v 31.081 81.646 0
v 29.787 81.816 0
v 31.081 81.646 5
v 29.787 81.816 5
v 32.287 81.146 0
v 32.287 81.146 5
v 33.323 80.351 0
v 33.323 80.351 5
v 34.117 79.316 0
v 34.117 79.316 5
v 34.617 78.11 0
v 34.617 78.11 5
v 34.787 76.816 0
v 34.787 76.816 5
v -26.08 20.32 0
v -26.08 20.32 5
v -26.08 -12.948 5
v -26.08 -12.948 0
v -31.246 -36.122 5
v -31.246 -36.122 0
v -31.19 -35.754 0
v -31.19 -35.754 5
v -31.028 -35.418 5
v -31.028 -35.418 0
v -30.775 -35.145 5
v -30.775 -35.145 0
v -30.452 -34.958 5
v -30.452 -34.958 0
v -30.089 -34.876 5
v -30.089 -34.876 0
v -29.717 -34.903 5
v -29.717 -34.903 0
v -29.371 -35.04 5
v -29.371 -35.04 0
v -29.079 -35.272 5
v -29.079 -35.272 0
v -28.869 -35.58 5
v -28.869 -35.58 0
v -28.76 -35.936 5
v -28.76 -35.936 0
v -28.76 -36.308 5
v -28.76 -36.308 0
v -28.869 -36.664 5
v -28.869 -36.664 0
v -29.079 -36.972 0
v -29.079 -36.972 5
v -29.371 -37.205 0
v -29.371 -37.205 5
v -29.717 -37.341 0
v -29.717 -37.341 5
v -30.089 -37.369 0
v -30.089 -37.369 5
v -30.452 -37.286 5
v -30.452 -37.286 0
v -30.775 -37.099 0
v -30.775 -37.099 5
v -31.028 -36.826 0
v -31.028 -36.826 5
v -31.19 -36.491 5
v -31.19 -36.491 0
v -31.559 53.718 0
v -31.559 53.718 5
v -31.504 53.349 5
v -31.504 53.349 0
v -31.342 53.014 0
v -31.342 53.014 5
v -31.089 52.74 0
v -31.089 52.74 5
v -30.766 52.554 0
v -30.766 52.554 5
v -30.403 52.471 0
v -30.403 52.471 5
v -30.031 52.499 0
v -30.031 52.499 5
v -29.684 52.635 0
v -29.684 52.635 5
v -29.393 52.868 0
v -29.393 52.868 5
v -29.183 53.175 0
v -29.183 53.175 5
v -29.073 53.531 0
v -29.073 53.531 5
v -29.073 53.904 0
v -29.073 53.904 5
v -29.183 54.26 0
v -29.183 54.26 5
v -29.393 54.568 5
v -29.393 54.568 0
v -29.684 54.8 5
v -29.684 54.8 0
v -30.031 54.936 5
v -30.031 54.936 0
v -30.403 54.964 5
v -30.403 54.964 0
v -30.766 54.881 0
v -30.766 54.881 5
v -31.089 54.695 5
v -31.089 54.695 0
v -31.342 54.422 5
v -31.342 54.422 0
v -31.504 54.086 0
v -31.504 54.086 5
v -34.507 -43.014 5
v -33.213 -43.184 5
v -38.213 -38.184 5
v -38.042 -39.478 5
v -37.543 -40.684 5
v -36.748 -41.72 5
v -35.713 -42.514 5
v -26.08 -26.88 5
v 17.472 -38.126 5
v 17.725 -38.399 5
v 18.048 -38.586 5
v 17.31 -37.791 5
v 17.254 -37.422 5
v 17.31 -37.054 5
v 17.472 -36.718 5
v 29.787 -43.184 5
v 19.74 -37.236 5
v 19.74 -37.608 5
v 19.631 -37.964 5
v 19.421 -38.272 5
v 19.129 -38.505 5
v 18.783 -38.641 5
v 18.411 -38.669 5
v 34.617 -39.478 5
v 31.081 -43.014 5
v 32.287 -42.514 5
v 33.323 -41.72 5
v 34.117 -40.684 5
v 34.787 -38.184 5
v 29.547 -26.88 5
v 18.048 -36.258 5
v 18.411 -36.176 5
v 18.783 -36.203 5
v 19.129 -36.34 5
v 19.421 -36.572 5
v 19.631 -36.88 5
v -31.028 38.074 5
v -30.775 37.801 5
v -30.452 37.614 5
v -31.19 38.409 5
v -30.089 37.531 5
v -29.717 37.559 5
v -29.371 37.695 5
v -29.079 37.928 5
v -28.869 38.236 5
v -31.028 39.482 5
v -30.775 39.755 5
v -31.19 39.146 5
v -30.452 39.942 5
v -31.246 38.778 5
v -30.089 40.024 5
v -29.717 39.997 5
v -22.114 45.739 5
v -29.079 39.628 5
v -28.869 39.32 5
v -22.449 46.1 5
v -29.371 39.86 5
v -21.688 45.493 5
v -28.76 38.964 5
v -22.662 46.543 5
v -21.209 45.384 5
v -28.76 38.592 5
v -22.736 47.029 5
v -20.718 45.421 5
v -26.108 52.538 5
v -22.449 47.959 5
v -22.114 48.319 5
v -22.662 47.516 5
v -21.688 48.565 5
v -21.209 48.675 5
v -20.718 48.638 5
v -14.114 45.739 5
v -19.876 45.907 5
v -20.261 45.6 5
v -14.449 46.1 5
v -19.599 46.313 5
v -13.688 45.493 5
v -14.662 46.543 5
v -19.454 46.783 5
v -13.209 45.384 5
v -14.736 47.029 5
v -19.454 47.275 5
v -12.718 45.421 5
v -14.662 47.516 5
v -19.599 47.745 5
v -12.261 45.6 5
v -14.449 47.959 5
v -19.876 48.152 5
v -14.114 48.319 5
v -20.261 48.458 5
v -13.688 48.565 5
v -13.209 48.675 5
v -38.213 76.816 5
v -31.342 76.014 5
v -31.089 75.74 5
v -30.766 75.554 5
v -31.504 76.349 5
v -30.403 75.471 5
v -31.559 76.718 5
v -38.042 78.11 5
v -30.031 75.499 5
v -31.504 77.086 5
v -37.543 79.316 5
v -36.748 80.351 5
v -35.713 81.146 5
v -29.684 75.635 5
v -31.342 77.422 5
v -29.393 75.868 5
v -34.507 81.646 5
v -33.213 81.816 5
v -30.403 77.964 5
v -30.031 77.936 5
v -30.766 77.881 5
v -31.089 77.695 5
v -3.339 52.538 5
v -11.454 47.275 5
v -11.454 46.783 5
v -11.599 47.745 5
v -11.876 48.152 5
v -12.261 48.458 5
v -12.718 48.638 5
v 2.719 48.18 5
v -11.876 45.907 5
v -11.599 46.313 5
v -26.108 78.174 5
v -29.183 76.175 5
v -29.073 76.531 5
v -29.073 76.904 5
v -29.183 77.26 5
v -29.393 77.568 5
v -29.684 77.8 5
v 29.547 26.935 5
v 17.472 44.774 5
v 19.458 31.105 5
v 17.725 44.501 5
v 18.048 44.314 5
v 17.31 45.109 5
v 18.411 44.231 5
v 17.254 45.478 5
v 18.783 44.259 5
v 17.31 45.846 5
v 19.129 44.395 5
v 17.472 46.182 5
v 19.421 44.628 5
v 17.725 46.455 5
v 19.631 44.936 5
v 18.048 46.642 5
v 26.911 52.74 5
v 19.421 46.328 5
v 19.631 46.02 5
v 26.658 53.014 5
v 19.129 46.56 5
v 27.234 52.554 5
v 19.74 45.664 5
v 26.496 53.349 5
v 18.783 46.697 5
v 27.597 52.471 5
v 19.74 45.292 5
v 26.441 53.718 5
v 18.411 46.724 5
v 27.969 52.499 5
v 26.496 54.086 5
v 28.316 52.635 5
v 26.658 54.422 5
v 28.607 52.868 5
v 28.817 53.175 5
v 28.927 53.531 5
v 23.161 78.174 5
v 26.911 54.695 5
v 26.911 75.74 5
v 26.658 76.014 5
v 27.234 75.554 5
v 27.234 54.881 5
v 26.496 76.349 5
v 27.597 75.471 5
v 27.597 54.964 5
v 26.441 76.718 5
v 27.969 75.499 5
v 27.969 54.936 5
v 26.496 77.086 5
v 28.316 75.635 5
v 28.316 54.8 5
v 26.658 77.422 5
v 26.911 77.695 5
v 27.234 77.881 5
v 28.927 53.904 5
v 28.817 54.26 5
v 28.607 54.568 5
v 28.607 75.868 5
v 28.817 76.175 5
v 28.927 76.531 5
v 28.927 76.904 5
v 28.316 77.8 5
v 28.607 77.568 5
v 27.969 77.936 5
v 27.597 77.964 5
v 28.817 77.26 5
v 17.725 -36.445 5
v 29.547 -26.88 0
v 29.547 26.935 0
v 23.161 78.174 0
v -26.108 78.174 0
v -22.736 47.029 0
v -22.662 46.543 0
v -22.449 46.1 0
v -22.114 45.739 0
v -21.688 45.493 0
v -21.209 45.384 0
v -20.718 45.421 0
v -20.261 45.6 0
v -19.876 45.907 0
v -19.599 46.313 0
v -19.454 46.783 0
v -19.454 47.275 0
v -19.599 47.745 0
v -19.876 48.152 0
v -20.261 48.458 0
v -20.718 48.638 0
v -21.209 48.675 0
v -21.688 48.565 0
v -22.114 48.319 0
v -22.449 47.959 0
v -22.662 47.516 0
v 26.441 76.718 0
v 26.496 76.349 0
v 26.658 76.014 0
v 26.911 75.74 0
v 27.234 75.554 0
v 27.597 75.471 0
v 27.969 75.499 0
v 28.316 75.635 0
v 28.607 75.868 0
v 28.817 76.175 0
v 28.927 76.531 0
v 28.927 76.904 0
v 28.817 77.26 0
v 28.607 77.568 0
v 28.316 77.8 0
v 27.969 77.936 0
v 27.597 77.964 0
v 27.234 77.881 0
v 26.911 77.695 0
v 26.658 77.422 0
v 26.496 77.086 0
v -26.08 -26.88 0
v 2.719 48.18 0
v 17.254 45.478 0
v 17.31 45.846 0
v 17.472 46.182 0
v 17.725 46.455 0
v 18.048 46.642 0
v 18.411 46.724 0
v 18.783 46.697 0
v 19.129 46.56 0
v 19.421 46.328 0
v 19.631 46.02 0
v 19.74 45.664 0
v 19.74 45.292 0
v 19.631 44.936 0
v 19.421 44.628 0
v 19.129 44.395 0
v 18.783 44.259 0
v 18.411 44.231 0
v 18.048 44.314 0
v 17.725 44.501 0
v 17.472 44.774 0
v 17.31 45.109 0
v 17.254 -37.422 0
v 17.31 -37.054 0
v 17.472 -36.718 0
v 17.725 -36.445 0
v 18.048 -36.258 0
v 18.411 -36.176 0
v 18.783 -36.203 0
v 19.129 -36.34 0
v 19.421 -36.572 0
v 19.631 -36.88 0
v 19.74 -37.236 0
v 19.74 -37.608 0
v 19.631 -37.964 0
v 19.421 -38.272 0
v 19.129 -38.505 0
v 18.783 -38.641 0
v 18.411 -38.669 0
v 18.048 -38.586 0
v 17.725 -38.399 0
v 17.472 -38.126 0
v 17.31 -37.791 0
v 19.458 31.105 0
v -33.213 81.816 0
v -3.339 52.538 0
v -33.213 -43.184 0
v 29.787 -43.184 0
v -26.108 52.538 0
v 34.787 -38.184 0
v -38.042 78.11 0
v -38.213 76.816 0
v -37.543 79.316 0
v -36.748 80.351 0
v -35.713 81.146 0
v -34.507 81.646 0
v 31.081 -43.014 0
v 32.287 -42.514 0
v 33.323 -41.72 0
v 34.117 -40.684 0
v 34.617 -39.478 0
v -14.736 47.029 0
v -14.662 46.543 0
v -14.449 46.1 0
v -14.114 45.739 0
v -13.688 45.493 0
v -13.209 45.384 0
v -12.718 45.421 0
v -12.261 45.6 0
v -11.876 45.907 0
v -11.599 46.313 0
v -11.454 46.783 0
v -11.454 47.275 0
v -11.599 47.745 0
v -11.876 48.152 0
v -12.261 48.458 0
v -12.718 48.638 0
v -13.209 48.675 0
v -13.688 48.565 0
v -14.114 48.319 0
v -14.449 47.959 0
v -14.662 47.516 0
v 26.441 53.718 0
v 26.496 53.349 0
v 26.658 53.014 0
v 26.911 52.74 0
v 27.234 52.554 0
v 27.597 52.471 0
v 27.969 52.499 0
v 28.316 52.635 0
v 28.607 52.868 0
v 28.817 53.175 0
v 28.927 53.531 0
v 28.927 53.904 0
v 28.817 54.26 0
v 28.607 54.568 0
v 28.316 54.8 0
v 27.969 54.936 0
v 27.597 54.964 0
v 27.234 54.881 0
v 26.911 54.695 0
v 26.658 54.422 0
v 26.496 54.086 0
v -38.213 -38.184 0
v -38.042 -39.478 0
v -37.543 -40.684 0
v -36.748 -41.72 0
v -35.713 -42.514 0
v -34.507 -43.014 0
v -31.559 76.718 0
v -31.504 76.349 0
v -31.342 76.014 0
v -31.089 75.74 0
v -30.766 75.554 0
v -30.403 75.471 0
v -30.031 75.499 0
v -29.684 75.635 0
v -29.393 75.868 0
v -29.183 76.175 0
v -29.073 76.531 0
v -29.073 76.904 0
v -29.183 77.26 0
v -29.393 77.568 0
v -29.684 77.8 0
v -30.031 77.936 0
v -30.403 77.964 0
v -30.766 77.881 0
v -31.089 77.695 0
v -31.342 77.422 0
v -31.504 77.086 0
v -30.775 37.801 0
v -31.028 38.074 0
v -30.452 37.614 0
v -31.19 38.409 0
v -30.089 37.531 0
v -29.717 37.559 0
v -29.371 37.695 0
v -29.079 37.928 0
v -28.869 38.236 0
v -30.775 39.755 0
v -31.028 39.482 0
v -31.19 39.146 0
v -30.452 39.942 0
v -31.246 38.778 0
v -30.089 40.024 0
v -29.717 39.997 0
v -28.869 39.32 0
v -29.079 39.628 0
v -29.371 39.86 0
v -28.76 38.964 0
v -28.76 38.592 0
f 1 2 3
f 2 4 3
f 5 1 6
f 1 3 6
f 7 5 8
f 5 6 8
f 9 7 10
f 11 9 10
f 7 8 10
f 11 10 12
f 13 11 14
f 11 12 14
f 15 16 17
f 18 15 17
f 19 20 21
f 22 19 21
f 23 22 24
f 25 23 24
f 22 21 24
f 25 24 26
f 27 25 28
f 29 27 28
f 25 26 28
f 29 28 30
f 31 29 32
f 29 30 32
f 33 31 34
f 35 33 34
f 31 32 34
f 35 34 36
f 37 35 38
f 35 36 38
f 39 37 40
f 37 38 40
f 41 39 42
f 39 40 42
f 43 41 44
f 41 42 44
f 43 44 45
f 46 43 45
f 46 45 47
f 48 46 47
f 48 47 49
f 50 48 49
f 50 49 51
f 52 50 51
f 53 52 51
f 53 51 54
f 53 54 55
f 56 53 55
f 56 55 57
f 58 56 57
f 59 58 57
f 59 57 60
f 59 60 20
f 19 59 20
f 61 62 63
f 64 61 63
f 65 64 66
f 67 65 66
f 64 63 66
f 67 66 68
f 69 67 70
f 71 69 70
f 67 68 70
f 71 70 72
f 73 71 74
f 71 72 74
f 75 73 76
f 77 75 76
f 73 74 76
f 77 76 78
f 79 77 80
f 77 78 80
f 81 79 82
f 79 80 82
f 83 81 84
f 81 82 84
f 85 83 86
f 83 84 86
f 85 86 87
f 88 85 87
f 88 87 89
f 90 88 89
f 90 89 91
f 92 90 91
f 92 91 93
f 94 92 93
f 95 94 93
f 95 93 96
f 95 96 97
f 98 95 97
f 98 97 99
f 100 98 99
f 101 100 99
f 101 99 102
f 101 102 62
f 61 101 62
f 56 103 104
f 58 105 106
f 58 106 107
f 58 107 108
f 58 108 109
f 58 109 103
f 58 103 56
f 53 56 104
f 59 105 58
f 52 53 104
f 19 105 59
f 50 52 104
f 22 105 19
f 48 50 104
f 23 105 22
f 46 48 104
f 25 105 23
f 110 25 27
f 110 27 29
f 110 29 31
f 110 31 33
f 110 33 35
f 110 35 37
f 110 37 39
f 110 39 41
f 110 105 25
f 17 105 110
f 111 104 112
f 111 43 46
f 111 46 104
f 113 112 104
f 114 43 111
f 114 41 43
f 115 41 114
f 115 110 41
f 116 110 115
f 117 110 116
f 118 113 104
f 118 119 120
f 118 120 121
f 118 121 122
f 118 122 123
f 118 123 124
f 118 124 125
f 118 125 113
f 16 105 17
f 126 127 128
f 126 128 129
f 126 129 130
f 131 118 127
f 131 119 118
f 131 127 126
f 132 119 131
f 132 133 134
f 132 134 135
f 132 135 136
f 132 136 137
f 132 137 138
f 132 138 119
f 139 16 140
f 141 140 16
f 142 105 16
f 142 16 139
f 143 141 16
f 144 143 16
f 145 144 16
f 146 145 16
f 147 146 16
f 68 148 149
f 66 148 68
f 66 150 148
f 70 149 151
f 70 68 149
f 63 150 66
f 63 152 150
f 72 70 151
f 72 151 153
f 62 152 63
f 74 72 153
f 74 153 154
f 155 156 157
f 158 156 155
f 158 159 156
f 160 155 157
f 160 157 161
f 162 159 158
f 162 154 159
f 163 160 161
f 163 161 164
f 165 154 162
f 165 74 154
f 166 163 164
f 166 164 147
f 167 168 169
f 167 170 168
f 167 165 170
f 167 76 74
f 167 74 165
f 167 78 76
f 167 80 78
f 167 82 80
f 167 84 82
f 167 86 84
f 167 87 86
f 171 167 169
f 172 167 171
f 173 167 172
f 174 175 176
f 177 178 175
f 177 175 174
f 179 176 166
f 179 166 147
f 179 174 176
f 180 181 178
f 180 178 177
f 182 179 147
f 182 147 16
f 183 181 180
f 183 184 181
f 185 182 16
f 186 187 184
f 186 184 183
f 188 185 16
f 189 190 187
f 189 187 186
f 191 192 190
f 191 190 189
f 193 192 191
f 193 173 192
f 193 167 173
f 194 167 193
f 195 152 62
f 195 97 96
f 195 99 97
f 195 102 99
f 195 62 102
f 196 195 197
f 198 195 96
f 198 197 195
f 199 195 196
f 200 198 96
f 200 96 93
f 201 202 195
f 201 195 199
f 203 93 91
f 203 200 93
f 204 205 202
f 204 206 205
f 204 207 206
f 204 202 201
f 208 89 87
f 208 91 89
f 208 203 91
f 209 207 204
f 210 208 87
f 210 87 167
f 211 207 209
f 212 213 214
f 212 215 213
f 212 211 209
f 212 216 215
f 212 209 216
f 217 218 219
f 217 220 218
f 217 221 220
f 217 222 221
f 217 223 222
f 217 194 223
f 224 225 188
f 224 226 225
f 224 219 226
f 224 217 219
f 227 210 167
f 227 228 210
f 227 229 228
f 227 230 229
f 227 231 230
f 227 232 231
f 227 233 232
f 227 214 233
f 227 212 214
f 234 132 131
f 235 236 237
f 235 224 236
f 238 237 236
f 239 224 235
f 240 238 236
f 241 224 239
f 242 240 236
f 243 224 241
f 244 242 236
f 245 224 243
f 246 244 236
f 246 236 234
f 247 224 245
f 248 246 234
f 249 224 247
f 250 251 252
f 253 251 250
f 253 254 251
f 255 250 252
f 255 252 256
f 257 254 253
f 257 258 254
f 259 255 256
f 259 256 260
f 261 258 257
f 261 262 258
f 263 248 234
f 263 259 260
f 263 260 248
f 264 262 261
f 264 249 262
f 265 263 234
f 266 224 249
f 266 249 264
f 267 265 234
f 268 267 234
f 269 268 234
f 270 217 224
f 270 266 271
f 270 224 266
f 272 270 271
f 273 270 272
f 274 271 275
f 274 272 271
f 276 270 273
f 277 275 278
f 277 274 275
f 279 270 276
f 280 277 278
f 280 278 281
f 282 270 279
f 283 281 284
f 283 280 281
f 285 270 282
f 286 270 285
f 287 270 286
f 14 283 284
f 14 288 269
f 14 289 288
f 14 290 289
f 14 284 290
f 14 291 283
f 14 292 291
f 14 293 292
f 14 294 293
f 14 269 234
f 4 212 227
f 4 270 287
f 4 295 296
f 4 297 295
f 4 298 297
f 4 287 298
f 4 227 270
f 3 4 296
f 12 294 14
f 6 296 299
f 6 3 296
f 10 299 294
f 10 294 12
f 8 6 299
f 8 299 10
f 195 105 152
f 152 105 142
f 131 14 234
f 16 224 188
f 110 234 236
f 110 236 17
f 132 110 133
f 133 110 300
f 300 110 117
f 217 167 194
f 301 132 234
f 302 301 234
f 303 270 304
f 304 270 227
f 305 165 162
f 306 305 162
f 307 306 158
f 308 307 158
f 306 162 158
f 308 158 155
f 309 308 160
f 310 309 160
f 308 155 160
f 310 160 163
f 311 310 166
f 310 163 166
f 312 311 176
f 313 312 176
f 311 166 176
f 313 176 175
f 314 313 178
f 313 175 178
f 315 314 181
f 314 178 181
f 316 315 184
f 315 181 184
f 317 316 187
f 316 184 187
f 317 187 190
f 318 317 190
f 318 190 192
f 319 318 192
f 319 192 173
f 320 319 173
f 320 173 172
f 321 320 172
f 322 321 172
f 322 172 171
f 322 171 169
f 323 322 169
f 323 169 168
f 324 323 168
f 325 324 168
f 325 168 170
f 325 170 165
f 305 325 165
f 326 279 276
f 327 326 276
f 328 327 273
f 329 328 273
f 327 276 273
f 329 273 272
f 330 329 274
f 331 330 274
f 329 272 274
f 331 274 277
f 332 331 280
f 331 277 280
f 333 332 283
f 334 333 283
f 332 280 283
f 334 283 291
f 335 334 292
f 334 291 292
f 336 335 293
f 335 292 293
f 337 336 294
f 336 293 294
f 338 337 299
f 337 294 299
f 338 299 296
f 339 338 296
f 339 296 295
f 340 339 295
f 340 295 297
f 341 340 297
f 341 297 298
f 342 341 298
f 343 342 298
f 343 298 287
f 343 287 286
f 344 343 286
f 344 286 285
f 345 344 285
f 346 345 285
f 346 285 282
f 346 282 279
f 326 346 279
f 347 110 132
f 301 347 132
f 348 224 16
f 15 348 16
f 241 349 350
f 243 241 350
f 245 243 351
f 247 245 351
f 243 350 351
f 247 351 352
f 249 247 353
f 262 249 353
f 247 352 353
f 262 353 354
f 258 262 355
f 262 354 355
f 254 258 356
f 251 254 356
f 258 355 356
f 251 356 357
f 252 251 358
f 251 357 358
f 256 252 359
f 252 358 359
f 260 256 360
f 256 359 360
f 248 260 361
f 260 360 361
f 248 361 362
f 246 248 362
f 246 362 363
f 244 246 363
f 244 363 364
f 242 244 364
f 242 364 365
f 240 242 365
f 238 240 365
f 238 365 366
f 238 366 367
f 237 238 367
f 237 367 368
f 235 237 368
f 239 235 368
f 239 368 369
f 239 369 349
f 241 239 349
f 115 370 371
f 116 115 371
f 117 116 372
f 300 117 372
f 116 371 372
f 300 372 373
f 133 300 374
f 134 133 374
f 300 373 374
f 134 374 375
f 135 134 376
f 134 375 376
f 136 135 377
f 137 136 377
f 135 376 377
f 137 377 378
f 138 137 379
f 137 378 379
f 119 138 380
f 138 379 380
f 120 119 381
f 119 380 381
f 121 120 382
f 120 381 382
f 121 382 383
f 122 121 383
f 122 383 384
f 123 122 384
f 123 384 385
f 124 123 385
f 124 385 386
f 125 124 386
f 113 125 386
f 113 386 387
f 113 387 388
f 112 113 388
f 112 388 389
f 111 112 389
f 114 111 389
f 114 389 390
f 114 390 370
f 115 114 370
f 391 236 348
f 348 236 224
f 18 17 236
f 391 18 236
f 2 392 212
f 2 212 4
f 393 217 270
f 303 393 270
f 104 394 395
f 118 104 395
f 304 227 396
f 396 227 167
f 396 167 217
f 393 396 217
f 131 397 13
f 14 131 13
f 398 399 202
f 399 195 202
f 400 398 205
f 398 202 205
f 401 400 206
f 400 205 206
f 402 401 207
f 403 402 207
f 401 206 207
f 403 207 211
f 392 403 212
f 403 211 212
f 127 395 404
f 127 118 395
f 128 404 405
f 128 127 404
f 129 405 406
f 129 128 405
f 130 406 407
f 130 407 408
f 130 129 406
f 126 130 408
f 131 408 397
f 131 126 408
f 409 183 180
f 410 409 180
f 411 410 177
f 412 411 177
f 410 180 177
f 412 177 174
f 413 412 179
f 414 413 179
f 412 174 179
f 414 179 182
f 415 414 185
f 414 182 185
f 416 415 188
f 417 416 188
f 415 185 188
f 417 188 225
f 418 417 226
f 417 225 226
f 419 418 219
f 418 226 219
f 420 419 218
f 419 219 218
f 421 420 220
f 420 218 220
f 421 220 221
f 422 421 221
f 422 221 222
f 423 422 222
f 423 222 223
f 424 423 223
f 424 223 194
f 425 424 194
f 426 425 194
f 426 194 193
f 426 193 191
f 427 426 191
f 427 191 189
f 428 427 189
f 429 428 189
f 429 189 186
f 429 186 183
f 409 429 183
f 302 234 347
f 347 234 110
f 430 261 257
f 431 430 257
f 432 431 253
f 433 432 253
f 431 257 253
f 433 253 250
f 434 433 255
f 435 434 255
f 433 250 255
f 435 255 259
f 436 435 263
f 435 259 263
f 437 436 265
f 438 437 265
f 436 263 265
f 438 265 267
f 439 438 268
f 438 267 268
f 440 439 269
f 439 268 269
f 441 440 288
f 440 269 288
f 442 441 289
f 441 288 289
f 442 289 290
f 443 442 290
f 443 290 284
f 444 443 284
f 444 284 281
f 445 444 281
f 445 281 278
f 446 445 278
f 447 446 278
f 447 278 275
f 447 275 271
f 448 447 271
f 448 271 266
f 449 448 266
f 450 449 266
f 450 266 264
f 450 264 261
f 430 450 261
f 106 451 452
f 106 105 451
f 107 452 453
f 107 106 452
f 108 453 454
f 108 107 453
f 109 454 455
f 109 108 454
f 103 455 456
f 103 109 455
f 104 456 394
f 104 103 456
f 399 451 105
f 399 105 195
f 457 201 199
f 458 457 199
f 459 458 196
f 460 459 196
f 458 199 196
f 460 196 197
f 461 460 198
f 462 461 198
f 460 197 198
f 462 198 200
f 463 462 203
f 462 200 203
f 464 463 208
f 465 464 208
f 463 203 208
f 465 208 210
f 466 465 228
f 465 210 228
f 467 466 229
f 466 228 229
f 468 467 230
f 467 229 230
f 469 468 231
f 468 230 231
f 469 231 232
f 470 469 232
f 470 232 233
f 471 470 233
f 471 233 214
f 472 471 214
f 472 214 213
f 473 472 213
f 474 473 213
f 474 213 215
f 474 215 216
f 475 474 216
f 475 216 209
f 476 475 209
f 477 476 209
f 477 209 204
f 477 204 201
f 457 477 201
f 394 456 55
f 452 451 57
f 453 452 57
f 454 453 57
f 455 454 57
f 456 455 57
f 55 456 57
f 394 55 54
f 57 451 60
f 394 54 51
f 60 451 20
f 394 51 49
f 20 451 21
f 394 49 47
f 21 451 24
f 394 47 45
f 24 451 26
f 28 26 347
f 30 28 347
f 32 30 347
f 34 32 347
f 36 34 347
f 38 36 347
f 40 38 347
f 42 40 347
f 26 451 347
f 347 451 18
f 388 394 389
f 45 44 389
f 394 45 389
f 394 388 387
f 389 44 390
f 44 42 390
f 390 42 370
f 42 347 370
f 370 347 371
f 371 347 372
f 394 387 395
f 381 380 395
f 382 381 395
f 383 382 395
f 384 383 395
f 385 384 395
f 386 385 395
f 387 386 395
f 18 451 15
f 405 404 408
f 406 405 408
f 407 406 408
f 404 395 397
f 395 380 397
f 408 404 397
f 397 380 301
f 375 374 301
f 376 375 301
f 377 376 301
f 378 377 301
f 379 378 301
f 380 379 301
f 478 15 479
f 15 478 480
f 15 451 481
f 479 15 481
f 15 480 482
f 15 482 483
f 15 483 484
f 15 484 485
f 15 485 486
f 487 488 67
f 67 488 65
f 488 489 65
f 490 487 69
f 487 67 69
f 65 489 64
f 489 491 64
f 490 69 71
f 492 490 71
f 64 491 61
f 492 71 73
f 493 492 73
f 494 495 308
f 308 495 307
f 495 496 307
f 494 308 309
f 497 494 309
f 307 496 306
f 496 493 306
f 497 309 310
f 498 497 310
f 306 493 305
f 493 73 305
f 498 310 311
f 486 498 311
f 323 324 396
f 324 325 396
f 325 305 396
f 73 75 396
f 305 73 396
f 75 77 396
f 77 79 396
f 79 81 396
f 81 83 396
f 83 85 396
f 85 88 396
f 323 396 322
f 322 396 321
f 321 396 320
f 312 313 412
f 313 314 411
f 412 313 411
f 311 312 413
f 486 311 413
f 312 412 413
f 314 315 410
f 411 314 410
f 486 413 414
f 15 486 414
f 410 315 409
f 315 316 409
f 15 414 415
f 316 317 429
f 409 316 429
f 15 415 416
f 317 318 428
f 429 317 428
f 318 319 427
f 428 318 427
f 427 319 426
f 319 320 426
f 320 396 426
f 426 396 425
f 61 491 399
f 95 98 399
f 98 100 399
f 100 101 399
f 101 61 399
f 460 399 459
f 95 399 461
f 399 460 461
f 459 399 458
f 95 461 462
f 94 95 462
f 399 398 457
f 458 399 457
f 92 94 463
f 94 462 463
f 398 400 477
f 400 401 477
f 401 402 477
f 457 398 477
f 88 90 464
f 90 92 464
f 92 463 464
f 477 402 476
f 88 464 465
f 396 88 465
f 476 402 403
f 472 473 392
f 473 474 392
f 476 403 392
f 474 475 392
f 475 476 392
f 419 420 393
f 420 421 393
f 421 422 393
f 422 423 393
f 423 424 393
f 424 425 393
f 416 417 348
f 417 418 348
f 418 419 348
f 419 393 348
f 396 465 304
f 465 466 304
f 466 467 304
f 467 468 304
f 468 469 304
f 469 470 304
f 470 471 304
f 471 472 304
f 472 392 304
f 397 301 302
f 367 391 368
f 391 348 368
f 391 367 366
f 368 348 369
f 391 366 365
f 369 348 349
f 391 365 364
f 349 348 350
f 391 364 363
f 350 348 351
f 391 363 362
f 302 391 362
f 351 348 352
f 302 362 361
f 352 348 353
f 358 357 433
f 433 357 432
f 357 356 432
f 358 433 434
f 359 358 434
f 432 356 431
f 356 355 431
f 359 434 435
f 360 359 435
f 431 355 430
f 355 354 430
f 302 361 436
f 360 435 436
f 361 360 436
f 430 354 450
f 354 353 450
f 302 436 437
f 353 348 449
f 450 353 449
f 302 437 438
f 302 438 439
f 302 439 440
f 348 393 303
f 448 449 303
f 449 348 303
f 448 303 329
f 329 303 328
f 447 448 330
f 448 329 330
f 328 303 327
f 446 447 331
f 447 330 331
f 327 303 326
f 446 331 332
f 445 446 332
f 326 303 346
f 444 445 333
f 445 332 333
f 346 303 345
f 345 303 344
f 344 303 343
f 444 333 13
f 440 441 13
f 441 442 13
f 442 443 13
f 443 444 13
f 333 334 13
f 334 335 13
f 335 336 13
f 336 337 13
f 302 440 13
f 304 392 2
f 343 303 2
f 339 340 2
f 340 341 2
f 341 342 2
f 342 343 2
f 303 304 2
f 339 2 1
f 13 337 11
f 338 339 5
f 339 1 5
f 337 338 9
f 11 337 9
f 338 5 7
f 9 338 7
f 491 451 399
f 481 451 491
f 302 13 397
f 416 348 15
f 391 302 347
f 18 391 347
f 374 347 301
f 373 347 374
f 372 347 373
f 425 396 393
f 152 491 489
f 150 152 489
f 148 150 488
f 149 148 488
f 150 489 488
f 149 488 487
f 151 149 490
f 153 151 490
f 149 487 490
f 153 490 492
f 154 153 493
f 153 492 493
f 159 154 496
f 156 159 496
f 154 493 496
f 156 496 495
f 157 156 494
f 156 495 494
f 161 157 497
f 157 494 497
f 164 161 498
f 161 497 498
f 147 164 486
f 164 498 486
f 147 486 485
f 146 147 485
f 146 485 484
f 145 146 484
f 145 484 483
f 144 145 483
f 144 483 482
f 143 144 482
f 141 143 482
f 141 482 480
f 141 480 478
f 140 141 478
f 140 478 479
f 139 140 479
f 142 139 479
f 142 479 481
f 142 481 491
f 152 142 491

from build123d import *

# Parameters (mm, degrees)
F0_W     = 73
F0_H     = 125
F1_DEPTH = 5
F2_D     = 2.5
F3_D     = 3.3
F4_R     = 5
F7_DEPTH = 25
F8_D     = 2.5


# Not quite as in the source:
# - a feature names something its author has since deleted; it is built from what else it names


with BuildPart() as f1:
    # F0 (on Top) → F1 (new body)
    with BuildSketch(Plane.XY):
        with Locations((-1.7126457989, 19.3158909678)):
            Rectangle(F0_W, F0_H)
    extrude(amount=F1_DEPTH)

    # F2 (through all)
    with Locations(Plane(origin=(0, 0, 0), x_dir=(1, 0, 0), z_dir=(0, 0, -1))):
        with Locations((-30.3091388196, -76.7177641392), (27.6908611804, -76.7177641392), (27.6908611804, -53.7177641392), (-30.3091388196, -53.7177641392)):
            Hole(F2_D / 2)

    # F3 (through all)
    with Locations(Plane(origin=(0, 0, 0), x_dir=(1, 0, 0), z_dir=(0, 0, -1))):
        with Locations((-21.0855398327, -47.0293052495), (-13.0855398327, -47.0293052495)):
            Hole(F3_D / 2)

    # F4
    f4_edges = [f1.edges().sort_by_distance(p)[0] for p in [
        (-38.212646, 81.815891, 2.5),
        (34.787354, 81.815891, 2.5),
        (34.787354, -43.184109, 2.5),
        (-38.212646, -43.184109, 2.5),
    ]]
    fillet(f4_edges, radius=F4_R)

    # F5 (on face) → F7 (cut)
    with BuildSketch(Plane.XY.offset(5)):
        Polygon((19.4577450805, 31.105422746), (2.7185706181, 48.1802586667), (-26.0799791984, 20.3202102417), (-26.0799791984, -12.9482956412), align=None)
        Polygon((29.5474557331, 26.9350063375), (-26.0799791984, -26.8796142191), (29.5474557331, -26.8796142191), align=None)
        Polygon((-3.3391041424, 52.5376833975), (23.1605084746, 78.173713526), (-26.1079283048, 78.173713526), (-26.1079283048, 52.5376833975), align=None)
    extrude(amount=-F7_DEPTH, mode=Mode.SUBTRACT)

    # F8 (through all)
    with Locations(Plane.XY.offset(5)):
        with Locations((-29.995566234, 38.7779349625), (18.504433766, 45.4779349625), (18.504433766, -37.4220650375), (-29.995566234, -36.1220650375)):
            Hole(F8_D / 2)


solid = f1.part
